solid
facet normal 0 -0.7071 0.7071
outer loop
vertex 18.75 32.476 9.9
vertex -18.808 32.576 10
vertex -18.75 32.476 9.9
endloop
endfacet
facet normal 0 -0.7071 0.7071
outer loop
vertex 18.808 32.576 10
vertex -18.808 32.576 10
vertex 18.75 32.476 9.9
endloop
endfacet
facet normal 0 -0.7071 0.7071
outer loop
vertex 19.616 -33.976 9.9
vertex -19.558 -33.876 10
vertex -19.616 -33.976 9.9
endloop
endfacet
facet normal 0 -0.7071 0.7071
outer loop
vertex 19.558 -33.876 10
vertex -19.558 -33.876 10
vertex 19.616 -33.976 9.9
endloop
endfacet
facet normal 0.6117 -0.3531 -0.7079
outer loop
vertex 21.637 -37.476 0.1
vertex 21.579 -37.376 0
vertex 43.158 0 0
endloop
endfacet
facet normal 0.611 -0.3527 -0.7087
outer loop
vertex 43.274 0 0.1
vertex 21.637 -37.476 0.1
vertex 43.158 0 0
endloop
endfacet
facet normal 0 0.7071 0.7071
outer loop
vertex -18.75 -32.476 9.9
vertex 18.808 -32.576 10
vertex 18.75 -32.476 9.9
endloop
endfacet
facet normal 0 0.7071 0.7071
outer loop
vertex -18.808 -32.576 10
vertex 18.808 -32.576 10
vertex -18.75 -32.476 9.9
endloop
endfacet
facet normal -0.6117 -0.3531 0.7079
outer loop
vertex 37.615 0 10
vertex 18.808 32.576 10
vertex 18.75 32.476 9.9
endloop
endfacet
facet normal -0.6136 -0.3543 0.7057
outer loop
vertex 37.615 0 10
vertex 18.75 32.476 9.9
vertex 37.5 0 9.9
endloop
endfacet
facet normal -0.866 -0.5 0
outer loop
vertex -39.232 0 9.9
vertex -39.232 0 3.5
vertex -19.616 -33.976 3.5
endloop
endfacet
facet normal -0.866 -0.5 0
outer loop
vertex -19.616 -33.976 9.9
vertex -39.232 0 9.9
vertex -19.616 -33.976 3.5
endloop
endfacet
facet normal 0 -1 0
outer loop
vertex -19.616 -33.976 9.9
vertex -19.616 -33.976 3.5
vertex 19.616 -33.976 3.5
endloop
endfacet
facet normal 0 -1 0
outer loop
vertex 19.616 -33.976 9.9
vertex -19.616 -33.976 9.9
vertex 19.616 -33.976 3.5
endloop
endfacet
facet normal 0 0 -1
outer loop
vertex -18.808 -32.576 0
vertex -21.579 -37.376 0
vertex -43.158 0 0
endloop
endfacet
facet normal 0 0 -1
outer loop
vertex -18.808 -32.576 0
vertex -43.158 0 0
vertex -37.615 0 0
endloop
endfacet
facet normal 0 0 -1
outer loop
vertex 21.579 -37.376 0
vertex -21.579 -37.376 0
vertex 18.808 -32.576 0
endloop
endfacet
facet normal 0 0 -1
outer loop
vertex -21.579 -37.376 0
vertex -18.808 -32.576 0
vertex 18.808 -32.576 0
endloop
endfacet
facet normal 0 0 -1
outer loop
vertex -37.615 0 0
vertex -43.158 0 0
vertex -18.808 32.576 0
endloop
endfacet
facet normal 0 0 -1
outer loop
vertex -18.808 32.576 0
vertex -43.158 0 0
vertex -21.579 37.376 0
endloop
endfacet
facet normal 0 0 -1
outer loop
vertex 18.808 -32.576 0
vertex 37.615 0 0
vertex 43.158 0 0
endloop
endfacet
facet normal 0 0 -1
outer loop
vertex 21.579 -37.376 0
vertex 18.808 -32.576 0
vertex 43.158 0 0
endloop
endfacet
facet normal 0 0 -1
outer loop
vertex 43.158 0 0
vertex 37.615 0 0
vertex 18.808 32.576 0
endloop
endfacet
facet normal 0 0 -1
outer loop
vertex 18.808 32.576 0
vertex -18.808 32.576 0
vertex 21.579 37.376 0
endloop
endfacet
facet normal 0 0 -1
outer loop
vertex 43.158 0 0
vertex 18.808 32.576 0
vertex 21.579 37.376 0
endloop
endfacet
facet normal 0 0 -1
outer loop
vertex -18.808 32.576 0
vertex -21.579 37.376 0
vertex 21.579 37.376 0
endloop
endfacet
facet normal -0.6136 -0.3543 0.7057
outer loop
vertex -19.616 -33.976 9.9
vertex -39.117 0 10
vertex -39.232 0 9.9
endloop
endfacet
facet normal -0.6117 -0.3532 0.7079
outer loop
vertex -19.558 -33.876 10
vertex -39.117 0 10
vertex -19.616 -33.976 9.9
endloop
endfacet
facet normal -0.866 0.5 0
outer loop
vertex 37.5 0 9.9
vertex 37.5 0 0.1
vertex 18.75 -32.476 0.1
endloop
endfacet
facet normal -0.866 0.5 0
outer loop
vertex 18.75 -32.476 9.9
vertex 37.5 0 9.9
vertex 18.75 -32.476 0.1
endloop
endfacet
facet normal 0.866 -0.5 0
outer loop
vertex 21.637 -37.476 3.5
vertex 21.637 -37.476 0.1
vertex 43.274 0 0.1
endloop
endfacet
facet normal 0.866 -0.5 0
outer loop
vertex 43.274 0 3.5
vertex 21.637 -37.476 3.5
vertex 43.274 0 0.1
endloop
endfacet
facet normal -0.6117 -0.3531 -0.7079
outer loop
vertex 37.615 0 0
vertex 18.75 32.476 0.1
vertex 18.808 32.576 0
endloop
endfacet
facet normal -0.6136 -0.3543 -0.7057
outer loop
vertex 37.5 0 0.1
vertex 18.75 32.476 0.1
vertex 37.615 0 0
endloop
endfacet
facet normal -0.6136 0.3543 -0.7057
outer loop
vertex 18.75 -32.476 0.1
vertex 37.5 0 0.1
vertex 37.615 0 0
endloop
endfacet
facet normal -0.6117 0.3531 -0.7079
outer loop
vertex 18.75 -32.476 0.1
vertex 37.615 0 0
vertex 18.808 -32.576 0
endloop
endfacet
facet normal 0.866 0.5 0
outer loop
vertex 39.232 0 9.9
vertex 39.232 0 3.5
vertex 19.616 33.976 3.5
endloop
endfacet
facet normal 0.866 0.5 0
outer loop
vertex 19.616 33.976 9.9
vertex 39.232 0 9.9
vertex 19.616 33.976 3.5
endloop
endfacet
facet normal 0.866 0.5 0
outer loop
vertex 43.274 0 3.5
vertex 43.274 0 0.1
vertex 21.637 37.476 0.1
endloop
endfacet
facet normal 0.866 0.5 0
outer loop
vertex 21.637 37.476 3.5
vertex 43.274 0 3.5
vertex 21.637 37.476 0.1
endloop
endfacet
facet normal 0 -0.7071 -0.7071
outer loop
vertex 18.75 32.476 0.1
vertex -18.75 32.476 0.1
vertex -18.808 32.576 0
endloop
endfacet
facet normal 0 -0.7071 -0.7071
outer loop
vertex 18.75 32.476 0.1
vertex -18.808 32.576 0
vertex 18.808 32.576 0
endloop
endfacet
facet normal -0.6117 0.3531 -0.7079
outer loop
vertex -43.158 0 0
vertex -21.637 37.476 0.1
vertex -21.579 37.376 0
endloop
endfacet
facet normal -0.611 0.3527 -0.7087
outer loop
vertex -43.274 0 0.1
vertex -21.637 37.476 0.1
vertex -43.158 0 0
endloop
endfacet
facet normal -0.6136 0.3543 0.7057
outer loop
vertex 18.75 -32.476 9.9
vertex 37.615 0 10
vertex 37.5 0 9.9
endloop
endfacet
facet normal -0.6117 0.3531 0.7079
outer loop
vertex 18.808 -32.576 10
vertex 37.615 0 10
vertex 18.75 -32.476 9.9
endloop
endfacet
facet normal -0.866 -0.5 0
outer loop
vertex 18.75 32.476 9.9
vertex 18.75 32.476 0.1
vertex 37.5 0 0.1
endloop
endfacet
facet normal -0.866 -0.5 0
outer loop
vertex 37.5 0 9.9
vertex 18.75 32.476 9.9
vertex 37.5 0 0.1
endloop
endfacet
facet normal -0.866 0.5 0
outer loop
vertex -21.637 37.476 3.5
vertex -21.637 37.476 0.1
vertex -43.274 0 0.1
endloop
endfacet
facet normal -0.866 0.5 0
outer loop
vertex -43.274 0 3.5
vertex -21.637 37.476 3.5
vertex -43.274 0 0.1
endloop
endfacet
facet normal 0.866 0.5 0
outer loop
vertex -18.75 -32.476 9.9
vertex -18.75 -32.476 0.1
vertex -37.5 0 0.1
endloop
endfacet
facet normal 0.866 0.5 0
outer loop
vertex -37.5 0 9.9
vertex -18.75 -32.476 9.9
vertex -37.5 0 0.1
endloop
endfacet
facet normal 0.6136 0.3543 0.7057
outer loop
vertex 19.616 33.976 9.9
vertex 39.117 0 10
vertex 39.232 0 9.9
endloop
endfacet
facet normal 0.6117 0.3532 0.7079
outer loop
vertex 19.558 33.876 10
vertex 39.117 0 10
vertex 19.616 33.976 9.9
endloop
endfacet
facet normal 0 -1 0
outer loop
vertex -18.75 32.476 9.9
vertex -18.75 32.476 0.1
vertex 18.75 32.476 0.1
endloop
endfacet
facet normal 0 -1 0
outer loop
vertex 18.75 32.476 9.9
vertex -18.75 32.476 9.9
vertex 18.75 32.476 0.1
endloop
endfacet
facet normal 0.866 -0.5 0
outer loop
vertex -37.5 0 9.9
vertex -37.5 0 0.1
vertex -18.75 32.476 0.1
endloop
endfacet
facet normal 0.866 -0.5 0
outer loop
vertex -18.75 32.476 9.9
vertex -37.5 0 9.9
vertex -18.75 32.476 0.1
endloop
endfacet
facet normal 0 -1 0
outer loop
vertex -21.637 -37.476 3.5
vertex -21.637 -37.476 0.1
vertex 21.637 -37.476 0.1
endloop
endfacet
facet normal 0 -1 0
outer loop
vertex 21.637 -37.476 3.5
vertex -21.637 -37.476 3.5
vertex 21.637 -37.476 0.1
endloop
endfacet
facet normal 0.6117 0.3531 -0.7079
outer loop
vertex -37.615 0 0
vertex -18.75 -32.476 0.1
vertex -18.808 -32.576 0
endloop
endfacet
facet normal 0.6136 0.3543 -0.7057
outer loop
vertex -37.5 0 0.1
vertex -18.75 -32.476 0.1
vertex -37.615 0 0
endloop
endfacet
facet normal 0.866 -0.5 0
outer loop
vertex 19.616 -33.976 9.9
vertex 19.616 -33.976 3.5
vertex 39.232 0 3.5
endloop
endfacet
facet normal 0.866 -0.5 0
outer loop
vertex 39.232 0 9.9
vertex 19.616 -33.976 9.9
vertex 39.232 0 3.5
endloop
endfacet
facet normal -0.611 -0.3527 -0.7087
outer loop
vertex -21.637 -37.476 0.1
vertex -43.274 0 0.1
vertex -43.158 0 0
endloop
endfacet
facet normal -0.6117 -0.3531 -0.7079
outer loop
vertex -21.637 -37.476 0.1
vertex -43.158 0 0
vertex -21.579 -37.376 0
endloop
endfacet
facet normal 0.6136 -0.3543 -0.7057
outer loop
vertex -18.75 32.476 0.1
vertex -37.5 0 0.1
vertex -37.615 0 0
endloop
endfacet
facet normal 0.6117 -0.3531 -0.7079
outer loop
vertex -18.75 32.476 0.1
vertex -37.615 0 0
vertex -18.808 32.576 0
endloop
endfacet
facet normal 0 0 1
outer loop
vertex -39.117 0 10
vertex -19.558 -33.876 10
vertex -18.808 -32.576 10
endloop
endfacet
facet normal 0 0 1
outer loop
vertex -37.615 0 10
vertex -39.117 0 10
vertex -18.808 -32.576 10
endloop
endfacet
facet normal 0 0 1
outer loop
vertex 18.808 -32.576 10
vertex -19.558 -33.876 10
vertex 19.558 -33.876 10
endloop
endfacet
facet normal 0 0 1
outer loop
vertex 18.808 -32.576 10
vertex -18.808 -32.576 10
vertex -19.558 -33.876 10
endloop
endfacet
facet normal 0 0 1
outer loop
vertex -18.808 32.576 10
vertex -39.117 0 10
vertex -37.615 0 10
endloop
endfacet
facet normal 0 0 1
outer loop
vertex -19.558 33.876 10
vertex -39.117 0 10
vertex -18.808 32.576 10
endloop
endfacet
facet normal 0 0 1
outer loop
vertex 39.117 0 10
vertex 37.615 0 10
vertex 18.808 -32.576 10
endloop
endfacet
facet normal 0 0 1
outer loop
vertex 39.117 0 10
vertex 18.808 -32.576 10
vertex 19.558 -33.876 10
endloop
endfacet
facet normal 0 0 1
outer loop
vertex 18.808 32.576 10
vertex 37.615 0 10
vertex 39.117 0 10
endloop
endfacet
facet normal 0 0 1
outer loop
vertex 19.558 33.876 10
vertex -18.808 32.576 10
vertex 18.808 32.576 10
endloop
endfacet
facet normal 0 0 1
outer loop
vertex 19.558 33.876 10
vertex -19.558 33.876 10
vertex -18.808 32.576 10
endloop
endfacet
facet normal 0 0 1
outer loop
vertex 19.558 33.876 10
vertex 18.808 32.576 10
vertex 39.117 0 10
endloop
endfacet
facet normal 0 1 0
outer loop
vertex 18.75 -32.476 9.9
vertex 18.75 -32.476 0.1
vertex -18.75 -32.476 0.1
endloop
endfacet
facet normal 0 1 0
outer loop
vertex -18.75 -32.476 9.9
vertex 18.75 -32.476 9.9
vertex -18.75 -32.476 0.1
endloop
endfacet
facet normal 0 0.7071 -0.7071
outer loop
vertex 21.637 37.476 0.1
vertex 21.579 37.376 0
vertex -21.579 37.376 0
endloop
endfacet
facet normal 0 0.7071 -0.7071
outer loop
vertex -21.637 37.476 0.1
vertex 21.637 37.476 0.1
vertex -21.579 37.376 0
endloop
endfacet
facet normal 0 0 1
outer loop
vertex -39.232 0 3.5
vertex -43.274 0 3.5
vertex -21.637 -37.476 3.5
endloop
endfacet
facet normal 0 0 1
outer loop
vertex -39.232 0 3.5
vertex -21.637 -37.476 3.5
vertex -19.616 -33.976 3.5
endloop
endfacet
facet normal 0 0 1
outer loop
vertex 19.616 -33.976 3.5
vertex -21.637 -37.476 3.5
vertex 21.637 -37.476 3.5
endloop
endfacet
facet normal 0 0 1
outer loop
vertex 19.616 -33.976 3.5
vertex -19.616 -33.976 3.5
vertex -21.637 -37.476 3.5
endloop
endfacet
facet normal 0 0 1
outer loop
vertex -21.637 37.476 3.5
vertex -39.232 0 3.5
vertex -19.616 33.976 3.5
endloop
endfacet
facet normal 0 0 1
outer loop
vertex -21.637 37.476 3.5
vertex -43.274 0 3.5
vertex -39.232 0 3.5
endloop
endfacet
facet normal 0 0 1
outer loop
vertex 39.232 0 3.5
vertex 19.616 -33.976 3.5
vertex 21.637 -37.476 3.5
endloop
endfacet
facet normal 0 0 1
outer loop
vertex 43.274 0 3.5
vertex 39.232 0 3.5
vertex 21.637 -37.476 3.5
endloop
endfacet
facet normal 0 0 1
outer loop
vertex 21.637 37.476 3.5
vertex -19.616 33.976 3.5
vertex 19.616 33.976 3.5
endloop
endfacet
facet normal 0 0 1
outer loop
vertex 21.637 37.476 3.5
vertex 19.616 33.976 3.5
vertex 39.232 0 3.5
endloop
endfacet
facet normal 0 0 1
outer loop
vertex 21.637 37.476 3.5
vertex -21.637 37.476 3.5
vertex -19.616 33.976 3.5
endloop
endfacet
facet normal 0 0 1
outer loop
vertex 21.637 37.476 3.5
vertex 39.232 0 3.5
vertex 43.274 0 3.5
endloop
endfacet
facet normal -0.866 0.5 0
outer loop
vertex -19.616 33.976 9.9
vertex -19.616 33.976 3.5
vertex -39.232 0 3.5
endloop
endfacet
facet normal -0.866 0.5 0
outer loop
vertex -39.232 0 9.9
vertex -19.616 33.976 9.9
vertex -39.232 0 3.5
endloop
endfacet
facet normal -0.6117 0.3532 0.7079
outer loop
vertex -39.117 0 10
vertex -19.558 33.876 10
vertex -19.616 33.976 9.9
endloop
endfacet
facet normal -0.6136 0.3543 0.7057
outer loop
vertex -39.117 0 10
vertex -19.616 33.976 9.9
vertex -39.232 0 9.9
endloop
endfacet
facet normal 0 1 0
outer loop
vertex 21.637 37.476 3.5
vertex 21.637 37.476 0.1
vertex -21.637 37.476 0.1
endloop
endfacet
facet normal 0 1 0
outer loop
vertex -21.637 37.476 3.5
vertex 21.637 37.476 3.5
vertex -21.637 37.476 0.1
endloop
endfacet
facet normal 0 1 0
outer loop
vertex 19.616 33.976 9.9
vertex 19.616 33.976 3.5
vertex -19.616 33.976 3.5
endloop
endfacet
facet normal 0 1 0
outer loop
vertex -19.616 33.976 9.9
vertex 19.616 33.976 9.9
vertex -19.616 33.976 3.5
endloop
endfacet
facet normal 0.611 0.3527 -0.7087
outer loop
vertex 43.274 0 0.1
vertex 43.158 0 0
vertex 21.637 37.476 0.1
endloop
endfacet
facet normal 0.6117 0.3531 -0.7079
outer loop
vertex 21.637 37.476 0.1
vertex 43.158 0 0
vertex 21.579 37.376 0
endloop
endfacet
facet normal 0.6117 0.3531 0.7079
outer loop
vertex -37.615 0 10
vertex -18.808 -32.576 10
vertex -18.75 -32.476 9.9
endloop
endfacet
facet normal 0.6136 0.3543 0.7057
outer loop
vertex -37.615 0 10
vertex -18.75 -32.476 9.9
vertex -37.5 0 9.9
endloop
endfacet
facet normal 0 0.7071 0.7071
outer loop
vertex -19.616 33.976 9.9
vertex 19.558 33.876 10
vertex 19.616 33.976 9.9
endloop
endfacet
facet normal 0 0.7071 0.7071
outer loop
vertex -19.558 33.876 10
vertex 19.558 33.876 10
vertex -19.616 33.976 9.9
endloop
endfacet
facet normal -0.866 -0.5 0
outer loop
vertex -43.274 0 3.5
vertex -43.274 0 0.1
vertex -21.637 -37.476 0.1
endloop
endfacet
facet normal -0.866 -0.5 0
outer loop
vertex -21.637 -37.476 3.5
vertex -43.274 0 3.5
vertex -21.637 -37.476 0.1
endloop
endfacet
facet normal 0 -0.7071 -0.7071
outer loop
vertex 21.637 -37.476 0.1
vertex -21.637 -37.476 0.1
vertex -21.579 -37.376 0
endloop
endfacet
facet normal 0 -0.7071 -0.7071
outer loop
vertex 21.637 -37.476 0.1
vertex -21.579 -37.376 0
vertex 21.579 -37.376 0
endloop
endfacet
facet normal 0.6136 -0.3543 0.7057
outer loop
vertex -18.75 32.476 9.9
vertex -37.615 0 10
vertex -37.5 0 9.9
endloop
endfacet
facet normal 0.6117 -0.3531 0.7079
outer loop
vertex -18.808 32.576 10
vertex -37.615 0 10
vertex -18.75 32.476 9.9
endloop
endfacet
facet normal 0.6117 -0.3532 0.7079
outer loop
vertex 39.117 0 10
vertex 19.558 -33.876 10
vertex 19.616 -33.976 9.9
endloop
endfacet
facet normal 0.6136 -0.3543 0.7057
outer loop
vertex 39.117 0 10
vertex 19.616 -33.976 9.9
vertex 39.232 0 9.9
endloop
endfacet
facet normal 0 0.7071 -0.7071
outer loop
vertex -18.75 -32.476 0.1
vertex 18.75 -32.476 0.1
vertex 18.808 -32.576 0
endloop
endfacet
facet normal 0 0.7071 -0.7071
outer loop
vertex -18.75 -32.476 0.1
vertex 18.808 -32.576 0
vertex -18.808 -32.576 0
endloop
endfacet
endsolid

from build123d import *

# Parameters (mm, degrees)
F1_DEPTH = 10
F2_DEPTH = 3.5
F3_SIZE  = 0.1


with BuildPart() as f1:
    # F0 (on Top) → F1 (new body)
    with BuildSketch(Plane.XY):
        Polygon((39.232051, 0), (19.616025, 33.975953), (-19.616025, 33.975953), (-39.232051, 0), (-19.616025, -33.975953), (19.616025, -33.975953), align=None)
        Polygon((-18.75, 32.475953), (18.75, 32.475953), (37.5, 0), (18.75, -32.475953), (-18.75, -32.475953), (-37.5, 0), align=None, mode=Mode.SUBTRACT)
    extrude(amount=F1_DEPTH)

    # F0 (on Top) → F2 (join)
    with BuildSketch(Plane.XY):
        Polygon((43.273503, 0), (21.636751, 37.475953), (-21.636751, 37.475953), (-43.273503, 0), (-21.636751, -37.475953), (21.636751, -37.475953), align=None)
        Polygon((-19.616025, 33.975953), (19.616025, 33.975953), (39.232051, 0), (19.616025, -33.975953), (-19.616025, -33.975953), (-39.232051, 0), align=None, mode=Mode.SUBTRACT)
    extrude(amount=F2_DEPTH)

    # F3
    f3_edges = [f1.edges().sort_by_distance(p)[0] for p in [
        (0, -37.475953, 0),
        (32.455127, -18.737976, 0),
        (32.455127, 18.737976, 0),
        (0, 37.475953, 0),
        (-32.455127, 18.737976, 0),
        (-32.455127, -18.737976, 0),
        (-28.125, -16.237976, 0),
        (-28.125, 16.237976, 0),
        (0, 32.475953, 0),
        (28.125, 16.237976, 0),
        (28.125, -16.237976, 0),
        (0, -32.475953, 0),
        (29.424038, 16.987976, 10),
        (0, 33.975953, 10),
        (-29.424038, 16.987976, 10),
        (-29.424038, -16.987976, 10),
        (0, -33.975953, 10),
        (29.424038, -16.987976, 10),
        (0, 32.475953, 10),
        (28.125, 16.237976, 10),
        (28.125, -16.237976, 10),
        (0, -32.475953, 10),
        (-28.125, -16.237976, 10),
        (-28.125, 16.237976, 10),
    ]]
    chamfer(f3_edges, length=F3_SIZE)


solid = f1.part
